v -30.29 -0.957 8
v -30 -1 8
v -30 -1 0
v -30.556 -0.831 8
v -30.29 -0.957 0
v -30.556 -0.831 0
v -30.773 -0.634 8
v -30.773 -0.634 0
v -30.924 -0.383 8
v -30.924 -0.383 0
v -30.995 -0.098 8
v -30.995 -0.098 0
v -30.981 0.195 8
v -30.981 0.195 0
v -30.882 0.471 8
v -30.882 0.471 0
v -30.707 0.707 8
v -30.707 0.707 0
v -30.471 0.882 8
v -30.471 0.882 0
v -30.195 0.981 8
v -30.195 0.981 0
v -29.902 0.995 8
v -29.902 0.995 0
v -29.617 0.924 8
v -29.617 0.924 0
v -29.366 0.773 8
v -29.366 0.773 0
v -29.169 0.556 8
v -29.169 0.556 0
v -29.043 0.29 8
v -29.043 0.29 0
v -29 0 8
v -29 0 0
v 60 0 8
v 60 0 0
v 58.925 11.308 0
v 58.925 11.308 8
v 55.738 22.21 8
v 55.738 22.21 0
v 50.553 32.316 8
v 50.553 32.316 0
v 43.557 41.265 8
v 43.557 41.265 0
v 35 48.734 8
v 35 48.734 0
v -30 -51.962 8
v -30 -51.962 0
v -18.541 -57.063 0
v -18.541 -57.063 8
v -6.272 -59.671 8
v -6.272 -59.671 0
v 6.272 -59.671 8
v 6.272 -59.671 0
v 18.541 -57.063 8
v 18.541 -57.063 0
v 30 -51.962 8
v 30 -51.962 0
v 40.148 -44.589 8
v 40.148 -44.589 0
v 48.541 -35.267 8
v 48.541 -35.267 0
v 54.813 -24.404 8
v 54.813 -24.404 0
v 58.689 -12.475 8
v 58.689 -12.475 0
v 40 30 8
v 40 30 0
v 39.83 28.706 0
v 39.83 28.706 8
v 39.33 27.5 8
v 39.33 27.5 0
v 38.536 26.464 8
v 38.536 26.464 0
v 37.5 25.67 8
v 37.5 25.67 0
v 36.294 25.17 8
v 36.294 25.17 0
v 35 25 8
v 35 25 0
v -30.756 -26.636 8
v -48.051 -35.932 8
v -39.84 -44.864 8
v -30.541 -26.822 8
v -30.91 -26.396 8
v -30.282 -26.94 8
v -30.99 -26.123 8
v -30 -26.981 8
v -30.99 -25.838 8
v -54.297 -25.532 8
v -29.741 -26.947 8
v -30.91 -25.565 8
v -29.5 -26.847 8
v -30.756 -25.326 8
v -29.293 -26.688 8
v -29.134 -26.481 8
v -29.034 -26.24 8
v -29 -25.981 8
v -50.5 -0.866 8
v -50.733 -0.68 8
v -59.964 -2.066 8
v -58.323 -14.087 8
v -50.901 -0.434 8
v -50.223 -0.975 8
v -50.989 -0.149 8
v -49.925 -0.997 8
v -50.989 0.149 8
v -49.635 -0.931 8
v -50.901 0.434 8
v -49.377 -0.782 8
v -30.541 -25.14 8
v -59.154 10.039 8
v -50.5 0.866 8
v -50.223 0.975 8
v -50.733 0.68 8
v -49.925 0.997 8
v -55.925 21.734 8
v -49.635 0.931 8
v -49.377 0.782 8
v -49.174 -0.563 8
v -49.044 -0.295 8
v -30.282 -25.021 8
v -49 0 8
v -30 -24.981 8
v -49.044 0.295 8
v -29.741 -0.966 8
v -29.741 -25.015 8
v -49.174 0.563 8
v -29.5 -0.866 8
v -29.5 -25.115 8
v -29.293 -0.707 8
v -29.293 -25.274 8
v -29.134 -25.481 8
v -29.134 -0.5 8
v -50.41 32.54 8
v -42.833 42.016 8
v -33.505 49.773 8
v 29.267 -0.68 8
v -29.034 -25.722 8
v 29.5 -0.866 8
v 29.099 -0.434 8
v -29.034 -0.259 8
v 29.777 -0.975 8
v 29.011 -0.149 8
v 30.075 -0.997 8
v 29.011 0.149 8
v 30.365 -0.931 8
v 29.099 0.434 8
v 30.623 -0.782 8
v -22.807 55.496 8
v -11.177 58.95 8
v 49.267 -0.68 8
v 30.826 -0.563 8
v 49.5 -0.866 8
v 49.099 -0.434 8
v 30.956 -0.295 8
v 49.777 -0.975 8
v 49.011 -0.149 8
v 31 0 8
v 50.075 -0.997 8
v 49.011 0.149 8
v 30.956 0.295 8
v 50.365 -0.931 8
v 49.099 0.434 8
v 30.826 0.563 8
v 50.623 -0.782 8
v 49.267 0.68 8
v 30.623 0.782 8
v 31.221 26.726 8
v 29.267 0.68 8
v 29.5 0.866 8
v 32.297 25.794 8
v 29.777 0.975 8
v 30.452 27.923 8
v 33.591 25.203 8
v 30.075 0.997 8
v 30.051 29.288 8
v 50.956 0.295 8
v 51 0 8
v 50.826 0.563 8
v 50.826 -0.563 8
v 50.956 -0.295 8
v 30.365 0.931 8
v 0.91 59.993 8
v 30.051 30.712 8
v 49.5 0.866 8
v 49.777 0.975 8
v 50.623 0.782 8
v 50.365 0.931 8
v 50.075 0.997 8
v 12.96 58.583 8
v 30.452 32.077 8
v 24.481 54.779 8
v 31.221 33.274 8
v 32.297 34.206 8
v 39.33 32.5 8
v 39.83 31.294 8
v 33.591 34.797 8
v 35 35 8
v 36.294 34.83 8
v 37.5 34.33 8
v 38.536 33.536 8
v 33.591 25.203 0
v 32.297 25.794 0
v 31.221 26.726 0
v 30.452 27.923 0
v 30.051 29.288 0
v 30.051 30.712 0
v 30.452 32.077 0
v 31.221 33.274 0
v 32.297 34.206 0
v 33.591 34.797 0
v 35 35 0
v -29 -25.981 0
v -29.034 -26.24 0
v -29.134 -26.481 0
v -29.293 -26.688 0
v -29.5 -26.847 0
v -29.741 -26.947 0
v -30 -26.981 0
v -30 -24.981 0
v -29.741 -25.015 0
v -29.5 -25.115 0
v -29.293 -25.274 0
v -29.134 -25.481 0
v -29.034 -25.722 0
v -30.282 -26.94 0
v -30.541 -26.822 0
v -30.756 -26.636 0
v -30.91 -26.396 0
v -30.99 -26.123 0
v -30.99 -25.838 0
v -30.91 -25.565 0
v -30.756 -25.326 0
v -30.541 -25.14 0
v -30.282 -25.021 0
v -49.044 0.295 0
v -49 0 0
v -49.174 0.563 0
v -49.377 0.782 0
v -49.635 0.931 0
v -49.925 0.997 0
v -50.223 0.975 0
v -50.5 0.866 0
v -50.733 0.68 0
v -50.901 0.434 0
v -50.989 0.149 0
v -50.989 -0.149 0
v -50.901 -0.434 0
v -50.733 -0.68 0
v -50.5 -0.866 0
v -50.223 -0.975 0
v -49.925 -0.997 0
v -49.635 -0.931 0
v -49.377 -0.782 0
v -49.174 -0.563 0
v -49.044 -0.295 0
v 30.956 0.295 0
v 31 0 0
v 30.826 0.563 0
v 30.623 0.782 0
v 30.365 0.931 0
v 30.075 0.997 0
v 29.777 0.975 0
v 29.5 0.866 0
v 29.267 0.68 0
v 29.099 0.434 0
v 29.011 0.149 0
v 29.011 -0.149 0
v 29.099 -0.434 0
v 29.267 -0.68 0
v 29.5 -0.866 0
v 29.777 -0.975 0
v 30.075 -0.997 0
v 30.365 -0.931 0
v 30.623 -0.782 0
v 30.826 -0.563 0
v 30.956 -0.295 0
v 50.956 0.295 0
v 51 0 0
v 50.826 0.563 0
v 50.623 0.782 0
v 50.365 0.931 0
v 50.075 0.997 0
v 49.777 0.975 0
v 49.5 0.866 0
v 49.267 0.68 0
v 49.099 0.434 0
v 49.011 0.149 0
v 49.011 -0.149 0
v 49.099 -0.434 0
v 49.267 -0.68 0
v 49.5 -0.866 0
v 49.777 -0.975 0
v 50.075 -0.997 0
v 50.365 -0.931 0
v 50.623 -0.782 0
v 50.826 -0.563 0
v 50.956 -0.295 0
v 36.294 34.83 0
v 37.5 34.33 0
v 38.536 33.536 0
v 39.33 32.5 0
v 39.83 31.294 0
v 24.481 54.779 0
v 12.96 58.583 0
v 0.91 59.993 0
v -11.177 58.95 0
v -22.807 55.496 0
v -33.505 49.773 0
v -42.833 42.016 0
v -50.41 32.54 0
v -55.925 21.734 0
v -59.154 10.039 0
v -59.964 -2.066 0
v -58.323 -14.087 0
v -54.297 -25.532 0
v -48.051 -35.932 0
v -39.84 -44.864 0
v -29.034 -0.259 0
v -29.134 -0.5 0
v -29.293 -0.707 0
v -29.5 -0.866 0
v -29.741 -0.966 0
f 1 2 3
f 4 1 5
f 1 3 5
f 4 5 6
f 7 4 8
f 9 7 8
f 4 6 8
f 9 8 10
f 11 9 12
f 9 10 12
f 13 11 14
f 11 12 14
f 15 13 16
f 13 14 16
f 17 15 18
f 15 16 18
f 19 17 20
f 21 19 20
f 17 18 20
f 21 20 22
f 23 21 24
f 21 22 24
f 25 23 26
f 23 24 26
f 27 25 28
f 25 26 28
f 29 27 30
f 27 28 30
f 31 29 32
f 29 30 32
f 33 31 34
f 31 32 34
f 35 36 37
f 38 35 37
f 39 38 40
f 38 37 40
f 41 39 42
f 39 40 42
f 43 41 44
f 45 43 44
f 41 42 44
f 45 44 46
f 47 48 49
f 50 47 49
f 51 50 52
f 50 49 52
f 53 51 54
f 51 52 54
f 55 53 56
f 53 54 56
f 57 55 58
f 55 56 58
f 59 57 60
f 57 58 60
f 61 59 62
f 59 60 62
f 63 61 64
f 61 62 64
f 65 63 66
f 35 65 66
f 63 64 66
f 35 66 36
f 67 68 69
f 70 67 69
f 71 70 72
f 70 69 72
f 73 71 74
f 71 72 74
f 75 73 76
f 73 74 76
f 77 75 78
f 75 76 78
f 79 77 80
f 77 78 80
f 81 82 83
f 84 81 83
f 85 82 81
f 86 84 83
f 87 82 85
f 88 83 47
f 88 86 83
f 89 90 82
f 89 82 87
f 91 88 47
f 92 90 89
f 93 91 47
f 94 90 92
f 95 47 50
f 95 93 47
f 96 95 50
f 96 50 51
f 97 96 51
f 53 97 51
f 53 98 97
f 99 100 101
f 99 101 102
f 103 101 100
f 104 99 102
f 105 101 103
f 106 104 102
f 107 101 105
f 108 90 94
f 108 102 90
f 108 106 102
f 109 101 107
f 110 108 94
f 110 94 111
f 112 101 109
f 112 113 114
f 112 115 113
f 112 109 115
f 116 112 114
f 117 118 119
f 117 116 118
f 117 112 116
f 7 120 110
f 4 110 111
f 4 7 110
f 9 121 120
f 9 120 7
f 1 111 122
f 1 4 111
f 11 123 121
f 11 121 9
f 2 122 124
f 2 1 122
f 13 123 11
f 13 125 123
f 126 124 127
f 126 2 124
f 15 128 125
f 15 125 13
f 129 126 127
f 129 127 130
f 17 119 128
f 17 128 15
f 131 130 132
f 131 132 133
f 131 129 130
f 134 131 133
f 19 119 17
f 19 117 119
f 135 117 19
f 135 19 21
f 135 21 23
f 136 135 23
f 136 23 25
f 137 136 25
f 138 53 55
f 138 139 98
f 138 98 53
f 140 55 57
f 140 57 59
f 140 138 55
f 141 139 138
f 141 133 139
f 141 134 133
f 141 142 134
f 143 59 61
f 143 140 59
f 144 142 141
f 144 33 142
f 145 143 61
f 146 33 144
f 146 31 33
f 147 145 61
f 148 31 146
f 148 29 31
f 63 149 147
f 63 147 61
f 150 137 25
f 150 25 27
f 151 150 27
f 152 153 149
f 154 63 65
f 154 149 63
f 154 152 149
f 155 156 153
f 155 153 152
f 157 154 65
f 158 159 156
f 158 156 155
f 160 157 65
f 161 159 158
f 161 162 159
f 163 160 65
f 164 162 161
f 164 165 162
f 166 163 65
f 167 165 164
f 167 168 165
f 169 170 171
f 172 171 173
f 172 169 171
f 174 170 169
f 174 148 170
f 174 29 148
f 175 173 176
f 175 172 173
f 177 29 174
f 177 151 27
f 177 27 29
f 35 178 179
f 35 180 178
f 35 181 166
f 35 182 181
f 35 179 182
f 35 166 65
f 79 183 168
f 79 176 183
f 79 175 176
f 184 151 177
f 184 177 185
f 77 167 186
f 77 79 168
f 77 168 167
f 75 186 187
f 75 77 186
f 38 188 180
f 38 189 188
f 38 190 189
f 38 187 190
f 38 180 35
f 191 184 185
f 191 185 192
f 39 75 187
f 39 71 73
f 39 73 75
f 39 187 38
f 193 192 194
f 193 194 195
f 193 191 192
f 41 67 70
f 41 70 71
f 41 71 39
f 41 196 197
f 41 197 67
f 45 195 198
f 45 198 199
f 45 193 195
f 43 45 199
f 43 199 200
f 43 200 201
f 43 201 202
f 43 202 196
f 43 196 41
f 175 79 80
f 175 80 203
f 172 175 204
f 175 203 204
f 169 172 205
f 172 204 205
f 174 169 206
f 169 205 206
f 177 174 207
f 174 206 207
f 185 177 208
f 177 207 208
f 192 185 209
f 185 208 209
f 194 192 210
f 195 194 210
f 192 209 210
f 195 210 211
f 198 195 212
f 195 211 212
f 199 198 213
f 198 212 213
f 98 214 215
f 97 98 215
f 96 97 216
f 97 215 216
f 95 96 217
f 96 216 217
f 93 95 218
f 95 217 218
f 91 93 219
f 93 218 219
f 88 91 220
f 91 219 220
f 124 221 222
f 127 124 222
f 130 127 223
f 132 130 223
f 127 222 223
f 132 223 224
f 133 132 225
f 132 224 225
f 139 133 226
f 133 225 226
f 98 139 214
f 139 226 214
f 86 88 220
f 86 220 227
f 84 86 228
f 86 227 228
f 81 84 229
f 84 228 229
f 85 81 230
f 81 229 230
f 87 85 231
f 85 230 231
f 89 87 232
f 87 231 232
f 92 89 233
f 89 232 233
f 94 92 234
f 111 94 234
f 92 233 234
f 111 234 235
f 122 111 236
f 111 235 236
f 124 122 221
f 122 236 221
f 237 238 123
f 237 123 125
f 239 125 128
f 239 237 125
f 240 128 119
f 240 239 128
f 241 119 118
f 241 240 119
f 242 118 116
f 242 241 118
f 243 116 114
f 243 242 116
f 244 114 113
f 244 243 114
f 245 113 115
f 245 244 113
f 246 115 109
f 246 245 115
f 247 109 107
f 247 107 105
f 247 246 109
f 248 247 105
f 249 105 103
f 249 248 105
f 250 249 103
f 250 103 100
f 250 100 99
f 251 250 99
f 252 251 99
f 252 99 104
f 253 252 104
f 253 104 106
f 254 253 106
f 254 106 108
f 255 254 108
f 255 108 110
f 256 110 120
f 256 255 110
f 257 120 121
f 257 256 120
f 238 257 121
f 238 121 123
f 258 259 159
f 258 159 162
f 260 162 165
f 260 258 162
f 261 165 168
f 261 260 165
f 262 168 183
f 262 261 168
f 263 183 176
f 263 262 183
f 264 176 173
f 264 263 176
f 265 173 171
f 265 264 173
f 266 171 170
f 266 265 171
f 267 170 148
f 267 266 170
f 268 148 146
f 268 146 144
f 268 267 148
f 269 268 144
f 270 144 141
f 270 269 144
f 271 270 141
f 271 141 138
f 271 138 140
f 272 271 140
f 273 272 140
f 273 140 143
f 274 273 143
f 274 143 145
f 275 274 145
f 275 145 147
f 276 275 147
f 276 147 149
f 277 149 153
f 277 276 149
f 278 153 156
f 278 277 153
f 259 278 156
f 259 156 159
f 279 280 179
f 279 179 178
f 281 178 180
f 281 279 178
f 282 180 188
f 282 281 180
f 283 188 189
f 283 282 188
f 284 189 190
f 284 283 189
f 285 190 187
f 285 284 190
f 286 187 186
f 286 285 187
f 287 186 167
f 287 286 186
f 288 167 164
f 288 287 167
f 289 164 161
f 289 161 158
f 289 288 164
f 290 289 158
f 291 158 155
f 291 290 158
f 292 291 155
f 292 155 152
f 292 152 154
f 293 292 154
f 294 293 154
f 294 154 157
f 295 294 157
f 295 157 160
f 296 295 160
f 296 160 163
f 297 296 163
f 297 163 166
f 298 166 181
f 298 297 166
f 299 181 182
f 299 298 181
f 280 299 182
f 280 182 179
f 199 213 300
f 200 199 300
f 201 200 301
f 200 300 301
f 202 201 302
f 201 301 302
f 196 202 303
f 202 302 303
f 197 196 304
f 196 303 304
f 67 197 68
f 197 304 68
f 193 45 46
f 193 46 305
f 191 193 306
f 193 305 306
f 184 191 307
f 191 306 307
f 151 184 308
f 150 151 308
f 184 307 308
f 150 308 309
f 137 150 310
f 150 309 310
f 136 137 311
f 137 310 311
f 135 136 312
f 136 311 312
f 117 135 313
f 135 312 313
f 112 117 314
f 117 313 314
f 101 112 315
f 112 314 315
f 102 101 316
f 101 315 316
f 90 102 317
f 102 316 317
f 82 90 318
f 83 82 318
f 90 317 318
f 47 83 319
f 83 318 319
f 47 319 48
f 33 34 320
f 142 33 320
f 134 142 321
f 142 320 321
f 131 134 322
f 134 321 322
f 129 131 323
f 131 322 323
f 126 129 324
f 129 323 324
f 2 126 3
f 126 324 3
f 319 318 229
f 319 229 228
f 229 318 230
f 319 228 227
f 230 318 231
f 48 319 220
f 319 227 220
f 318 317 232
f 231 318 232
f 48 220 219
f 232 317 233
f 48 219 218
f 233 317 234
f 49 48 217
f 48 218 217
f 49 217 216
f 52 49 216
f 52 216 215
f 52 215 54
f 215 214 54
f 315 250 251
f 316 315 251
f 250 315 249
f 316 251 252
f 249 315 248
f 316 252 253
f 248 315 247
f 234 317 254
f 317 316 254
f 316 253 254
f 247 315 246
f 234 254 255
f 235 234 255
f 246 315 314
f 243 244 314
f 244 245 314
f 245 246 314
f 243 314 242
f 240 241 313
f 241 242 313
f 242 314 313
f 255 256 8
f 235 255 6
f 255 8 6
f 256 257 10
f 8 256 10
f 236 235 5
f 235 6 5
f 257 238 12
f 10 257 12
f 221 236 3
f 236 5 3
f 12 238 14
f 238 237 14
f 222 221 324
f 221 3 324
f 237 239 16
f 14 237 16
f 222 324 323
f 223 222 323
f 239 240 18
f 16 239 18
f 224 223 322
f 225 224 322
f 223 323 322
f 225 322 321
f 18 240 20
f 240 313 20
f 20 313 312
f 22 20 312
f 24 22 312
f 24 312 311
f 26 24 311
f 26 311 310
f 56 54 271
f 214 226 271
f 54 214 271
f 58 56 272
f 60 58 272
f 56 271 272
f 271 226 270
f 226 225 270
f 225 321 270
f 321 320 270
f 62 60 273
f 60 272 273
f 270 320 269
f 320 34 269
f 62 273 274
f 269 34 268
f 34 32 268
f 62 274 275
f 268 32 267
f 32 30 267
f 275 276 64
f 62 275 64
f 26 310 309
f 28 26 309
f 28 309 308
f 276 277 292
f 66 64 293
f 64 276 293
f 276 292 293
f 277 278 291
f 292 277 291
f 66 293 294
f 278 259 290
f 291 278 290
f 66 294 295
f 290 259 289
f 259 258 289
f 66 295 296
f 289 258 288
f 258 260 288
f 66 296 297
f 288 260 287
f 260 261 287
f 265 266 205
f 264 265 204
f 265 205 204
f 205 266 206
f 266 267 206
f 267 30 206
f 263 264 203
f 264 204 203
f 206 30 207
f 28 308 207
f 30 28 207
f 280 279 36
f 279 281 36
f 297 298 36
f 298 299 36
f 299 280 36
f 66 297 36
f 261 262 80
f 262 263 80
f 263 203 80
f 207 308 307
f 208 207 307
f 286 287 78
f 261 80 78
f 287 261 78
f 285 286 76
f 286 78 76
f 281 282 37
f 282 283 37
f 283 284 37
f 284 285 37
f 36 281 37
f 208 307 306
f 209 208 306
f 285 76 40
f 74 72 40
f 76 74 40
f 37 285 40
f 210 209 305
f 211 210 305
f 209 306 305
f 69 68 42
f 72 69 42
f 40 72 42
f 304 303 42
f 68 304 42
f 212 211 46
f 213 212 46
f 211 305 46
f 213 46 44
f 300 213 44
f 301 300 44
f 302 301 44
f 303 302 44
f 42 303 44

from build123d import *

# Parameters (mm, degrees)
F0_R     = 1
F1_DEPTH = 8


with BuildPart() as f1:
    # F0 (on Top) → F1 (new body)
    with BuildSketch(Plane.XY):
        with BuildLine():
            ThreePointArc((-30, -51.961524), (30, -51.961524), (60, 0))
            ThreePointArc((60, 0), (53.385391, 27.386128), (35, 48.733972))
            ThreePointArc((35, 48.733972), (-50.409778, 32.540041), (-30, -51.961524))
        make_face()
        with BuildLine():
            ThreePointArc((-29, -25.980762), (-29.292893, -26.687869), (-30, -26.980762))
            ThreePointArc((-30, -26.980762), (-31, -25.980762), (-30, -24.980762))
            ThreePointArc((-30, -24.980762), (-29.292893, -25.273655), (-29, -25.980762))
        make_face(mode=Mode.SUBTRACT)
        with Locations((-50, 0)):
            Circle(F0_R, mode=Mode.SUBTRACT)
        with BuildLine():
            ThreePointArc((-29, 0), (-29.292893, -0.707107), (-30, -1))
            ThreePointArc((-30, -1), (-30.707107, 0.707107), (-29, 0))
        make_face(mode=Mode.SUBTRACT)
        with Locations((30, 0)):
            Circle(F0_R, mode=Mode.SUBTRACT)
        with Locations((50, 0)):
            Circle(F0_R, mode=Mode.SUBTRACT)
        with BuildLine():
            ThreePointArc((35, 25), (30, 30), (35, 35))
            ThreePointArc((35, 35), (38.535534, 33.535534), (40, 30))
            ThreePointArc((40, 30), (38.535534, 26.464466), (35, 25))
        make_face(mode=Mode.SUBTRACT)
    extrude(amount=F1_DEPTH)


solid = f1.part
